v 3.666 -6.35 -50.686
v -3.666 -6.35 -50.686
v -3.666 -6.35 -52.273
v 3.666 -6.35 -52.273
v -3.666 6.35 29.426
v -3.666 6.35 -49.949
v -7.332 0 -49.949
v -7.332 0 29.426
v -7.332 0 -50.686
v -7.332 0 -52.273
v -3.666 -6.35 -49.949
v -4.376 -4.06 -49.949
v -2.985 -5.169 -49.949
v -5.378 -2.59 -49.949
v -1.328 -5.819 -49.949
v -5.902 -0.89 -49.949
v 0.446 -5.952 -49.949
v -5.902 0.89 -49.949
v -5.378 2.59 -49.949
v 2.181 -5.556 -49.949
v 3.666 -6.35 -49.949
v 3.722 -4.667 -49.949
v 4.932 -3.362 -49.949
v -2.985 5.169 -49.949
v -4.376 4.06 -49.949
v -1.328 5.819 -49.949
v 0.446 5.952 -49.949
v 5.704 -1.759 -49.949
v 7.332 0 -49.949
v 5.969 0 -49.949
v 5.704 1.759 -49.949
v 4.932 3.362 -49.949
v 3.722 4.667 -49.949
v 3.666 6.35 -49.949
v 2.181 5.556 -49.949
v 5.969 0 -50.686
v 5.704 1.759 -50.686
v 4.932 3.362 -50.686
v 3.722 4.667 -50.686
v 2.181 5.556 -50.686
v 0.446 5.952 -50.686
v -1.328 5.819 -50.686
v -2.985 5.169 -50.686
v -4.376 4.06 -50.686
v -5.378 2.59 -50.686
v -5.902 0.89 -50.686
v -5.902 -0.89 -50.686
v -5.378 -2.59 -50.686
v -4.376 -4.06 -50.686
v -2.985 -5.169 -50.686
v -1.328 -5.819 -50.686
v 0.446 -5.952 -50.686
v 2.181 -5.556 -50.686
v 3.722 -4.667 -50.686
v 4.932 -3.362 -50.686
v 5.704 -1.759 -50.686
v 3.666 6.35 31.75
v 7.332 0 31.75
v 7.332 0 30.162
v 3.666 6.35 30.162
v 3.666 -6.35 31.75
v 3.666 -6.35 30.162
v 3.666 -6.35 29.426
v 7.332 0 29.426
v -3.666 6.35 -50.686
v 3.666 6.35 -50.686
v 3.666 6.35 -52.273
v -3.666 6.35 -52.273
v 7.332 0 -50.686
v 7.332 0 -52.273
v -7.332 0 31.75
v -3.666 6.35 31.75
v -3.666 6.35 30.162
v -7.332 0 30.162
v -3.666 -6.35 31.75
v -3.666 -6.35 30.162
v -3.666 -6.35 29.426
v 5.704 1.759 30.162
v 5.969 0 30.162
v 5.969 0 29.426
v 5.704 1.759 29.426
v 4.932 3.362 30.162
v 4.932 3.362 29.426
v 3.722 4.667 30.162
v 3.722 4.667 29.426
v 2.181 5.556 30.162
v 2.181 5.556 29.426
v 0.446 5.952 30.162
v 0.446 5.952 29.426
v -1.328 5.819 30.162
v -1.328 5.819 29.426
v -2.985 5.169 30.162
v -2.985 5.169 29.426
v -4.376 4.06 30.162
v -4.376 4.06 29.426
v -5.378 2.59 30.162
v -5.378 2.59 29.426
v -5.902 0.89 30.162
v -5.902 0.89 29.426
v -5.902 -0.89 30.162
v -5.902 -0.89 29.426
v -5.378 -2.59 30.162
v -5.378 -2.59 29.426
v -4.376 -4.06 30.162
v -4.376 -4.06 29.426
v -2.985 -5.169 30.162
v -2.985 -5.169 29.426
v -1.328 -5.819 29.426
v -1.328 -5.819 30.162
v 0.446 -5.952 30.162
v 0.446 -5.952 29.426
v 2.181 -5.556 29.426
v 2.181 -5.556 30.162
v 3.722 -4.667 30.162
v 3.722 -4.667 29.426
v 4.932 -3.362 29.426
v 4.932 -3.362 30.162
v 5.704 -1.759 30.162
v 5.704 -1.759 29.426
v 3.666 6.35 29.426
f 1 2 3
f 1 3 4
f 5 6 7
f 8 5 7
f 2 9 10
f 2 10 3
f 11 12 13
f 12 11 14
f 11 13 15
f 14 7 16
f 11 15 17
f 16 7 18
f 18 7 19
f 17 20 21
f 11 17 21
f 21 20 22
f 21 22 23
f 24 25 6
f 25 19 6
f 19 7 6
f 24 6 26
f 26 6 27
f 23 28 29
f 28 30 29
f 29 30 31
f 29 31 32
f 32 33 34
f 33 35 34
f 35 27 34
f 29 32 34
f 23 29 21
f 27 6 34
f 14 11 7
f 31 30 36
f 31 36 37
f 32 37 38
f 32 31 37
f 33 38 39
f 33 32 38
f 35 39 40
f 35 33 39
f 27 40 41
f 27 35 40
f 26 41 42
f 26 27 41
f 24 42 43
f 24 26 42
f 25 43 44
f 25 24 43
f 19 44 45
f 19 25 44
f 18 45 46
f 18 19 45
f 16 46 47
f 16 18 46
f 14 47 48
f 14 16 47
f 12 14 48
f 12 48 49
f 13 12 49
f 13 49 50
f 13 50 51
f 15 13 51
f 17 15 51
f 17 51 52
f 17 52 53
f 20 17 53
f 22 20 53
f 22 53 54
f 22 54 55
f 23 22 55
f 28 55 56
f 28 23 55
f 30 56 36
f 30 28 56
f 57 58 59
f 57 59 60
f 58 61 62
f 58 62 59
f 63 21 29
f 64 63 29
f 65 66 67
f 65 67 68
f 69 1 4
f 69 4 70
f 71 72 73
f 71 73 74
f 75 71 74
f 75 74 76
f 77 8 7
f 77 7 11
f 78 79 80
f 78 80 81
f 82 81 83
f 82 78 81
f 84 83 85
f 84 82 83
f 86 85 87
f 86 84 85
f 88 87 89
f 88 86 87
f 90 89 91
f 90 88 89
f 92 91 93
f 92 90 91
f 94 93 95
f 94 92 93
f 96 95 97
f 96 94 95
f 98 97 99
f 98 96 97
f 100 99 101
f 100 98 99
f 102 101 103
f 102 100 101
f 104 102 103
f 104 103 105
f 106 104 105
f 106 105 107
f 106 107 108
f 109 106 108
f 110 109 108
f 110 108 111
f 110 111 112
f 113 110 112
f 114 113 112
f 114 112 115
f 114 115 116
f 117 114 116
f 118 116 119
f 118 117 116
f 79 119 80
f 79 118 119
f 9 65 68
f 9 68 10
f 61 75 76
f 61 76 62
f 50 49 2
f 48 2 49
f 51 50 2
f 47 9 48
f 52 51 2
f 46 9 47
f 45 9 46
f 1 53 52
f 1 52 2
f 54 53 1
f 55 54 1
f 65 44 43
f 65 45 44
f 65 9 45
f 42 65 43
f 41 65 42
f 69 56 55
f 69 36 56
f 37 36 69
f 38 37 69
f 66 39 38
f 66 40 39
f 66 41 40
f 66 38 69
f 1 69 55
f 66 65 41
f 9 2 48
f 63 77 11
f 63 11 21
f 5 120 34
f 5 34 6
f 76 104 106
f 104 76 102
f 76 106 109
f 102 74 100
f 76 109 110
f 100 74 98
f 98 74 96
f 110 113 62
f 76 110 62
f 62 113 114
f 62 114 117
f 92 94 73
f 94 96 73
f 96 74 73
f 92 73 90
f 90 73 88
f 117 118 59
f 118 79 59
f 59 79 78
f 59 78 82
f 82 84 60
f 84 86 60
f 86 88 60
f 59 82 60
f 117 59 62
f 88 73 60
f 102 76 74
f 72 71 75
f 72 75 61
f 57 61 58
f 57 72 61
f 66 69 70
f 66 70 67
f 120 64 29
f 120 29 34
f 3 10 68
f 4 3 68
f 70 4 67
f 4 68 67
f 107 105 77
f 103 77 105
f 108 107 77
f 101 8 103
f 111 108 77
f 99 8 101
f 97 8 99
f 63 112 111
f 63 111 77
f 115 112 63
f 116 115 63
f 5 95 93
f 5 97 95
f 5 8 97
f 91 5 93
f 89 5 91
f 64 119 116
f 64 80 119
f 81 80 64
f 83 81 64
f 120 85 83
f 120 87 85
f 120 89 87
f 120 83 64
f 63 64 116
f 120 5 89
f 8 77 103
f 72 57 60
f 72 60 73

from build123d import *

# Parameters (mm, degrees)
BOSS_EXTRUDE1_DEPTH = 84.0232
SKETCH2_R           = 5.969
CUT_EXTRUDE1_DEPTH  = 0.7366
LPATTERN1_COUNT     = 2
LPATTERN1_PITCH     = 80.1116


with BuildPart() as part:
    # Sketch1 → Boss-Extrude1 (new body)
    with BuildSketch(Plane.XY.offset(31.75)):
        Polygon((7.332348419, 0), (3.666174209, 6.35), (-3.666174209, 6.35), (-7.332348419, 0), (-3.666174209, -6.35), (3.666174209, -6.35), align=None)
    extrude(amount=-BOSS_EXTRUDE1_DEPTH)

    # Sketch2 → Cut-Extrude1 (cut)
    with BuildSketch(Plane.XY.offset(30.1625)):
        Polygon((-3.666174209, -6.35), (3.666174209, -6.35), (7.332348419, 0), (3.666174209, 6.35), (-3.666174209, 6.35), (-7.332348419, 0), align=None)
        Circle(SKETCH2_R, mode=Mode.SUBTRACT)
    cut_extrude1 = extrude(amount=-CUT_EXTRUDE1_DEPTH, mode=Mode.SUBTRACT)

    # LPattern1: Cut-Extrude1 ×2
    with Locations(*[(0, 0, -i * LPATTERN1_PITCH) for i in range(1, LPATTERN1_COUNT)]):
        add(cut_extrude1, mode=Mode.SUBTRACT)


solid = part.part
